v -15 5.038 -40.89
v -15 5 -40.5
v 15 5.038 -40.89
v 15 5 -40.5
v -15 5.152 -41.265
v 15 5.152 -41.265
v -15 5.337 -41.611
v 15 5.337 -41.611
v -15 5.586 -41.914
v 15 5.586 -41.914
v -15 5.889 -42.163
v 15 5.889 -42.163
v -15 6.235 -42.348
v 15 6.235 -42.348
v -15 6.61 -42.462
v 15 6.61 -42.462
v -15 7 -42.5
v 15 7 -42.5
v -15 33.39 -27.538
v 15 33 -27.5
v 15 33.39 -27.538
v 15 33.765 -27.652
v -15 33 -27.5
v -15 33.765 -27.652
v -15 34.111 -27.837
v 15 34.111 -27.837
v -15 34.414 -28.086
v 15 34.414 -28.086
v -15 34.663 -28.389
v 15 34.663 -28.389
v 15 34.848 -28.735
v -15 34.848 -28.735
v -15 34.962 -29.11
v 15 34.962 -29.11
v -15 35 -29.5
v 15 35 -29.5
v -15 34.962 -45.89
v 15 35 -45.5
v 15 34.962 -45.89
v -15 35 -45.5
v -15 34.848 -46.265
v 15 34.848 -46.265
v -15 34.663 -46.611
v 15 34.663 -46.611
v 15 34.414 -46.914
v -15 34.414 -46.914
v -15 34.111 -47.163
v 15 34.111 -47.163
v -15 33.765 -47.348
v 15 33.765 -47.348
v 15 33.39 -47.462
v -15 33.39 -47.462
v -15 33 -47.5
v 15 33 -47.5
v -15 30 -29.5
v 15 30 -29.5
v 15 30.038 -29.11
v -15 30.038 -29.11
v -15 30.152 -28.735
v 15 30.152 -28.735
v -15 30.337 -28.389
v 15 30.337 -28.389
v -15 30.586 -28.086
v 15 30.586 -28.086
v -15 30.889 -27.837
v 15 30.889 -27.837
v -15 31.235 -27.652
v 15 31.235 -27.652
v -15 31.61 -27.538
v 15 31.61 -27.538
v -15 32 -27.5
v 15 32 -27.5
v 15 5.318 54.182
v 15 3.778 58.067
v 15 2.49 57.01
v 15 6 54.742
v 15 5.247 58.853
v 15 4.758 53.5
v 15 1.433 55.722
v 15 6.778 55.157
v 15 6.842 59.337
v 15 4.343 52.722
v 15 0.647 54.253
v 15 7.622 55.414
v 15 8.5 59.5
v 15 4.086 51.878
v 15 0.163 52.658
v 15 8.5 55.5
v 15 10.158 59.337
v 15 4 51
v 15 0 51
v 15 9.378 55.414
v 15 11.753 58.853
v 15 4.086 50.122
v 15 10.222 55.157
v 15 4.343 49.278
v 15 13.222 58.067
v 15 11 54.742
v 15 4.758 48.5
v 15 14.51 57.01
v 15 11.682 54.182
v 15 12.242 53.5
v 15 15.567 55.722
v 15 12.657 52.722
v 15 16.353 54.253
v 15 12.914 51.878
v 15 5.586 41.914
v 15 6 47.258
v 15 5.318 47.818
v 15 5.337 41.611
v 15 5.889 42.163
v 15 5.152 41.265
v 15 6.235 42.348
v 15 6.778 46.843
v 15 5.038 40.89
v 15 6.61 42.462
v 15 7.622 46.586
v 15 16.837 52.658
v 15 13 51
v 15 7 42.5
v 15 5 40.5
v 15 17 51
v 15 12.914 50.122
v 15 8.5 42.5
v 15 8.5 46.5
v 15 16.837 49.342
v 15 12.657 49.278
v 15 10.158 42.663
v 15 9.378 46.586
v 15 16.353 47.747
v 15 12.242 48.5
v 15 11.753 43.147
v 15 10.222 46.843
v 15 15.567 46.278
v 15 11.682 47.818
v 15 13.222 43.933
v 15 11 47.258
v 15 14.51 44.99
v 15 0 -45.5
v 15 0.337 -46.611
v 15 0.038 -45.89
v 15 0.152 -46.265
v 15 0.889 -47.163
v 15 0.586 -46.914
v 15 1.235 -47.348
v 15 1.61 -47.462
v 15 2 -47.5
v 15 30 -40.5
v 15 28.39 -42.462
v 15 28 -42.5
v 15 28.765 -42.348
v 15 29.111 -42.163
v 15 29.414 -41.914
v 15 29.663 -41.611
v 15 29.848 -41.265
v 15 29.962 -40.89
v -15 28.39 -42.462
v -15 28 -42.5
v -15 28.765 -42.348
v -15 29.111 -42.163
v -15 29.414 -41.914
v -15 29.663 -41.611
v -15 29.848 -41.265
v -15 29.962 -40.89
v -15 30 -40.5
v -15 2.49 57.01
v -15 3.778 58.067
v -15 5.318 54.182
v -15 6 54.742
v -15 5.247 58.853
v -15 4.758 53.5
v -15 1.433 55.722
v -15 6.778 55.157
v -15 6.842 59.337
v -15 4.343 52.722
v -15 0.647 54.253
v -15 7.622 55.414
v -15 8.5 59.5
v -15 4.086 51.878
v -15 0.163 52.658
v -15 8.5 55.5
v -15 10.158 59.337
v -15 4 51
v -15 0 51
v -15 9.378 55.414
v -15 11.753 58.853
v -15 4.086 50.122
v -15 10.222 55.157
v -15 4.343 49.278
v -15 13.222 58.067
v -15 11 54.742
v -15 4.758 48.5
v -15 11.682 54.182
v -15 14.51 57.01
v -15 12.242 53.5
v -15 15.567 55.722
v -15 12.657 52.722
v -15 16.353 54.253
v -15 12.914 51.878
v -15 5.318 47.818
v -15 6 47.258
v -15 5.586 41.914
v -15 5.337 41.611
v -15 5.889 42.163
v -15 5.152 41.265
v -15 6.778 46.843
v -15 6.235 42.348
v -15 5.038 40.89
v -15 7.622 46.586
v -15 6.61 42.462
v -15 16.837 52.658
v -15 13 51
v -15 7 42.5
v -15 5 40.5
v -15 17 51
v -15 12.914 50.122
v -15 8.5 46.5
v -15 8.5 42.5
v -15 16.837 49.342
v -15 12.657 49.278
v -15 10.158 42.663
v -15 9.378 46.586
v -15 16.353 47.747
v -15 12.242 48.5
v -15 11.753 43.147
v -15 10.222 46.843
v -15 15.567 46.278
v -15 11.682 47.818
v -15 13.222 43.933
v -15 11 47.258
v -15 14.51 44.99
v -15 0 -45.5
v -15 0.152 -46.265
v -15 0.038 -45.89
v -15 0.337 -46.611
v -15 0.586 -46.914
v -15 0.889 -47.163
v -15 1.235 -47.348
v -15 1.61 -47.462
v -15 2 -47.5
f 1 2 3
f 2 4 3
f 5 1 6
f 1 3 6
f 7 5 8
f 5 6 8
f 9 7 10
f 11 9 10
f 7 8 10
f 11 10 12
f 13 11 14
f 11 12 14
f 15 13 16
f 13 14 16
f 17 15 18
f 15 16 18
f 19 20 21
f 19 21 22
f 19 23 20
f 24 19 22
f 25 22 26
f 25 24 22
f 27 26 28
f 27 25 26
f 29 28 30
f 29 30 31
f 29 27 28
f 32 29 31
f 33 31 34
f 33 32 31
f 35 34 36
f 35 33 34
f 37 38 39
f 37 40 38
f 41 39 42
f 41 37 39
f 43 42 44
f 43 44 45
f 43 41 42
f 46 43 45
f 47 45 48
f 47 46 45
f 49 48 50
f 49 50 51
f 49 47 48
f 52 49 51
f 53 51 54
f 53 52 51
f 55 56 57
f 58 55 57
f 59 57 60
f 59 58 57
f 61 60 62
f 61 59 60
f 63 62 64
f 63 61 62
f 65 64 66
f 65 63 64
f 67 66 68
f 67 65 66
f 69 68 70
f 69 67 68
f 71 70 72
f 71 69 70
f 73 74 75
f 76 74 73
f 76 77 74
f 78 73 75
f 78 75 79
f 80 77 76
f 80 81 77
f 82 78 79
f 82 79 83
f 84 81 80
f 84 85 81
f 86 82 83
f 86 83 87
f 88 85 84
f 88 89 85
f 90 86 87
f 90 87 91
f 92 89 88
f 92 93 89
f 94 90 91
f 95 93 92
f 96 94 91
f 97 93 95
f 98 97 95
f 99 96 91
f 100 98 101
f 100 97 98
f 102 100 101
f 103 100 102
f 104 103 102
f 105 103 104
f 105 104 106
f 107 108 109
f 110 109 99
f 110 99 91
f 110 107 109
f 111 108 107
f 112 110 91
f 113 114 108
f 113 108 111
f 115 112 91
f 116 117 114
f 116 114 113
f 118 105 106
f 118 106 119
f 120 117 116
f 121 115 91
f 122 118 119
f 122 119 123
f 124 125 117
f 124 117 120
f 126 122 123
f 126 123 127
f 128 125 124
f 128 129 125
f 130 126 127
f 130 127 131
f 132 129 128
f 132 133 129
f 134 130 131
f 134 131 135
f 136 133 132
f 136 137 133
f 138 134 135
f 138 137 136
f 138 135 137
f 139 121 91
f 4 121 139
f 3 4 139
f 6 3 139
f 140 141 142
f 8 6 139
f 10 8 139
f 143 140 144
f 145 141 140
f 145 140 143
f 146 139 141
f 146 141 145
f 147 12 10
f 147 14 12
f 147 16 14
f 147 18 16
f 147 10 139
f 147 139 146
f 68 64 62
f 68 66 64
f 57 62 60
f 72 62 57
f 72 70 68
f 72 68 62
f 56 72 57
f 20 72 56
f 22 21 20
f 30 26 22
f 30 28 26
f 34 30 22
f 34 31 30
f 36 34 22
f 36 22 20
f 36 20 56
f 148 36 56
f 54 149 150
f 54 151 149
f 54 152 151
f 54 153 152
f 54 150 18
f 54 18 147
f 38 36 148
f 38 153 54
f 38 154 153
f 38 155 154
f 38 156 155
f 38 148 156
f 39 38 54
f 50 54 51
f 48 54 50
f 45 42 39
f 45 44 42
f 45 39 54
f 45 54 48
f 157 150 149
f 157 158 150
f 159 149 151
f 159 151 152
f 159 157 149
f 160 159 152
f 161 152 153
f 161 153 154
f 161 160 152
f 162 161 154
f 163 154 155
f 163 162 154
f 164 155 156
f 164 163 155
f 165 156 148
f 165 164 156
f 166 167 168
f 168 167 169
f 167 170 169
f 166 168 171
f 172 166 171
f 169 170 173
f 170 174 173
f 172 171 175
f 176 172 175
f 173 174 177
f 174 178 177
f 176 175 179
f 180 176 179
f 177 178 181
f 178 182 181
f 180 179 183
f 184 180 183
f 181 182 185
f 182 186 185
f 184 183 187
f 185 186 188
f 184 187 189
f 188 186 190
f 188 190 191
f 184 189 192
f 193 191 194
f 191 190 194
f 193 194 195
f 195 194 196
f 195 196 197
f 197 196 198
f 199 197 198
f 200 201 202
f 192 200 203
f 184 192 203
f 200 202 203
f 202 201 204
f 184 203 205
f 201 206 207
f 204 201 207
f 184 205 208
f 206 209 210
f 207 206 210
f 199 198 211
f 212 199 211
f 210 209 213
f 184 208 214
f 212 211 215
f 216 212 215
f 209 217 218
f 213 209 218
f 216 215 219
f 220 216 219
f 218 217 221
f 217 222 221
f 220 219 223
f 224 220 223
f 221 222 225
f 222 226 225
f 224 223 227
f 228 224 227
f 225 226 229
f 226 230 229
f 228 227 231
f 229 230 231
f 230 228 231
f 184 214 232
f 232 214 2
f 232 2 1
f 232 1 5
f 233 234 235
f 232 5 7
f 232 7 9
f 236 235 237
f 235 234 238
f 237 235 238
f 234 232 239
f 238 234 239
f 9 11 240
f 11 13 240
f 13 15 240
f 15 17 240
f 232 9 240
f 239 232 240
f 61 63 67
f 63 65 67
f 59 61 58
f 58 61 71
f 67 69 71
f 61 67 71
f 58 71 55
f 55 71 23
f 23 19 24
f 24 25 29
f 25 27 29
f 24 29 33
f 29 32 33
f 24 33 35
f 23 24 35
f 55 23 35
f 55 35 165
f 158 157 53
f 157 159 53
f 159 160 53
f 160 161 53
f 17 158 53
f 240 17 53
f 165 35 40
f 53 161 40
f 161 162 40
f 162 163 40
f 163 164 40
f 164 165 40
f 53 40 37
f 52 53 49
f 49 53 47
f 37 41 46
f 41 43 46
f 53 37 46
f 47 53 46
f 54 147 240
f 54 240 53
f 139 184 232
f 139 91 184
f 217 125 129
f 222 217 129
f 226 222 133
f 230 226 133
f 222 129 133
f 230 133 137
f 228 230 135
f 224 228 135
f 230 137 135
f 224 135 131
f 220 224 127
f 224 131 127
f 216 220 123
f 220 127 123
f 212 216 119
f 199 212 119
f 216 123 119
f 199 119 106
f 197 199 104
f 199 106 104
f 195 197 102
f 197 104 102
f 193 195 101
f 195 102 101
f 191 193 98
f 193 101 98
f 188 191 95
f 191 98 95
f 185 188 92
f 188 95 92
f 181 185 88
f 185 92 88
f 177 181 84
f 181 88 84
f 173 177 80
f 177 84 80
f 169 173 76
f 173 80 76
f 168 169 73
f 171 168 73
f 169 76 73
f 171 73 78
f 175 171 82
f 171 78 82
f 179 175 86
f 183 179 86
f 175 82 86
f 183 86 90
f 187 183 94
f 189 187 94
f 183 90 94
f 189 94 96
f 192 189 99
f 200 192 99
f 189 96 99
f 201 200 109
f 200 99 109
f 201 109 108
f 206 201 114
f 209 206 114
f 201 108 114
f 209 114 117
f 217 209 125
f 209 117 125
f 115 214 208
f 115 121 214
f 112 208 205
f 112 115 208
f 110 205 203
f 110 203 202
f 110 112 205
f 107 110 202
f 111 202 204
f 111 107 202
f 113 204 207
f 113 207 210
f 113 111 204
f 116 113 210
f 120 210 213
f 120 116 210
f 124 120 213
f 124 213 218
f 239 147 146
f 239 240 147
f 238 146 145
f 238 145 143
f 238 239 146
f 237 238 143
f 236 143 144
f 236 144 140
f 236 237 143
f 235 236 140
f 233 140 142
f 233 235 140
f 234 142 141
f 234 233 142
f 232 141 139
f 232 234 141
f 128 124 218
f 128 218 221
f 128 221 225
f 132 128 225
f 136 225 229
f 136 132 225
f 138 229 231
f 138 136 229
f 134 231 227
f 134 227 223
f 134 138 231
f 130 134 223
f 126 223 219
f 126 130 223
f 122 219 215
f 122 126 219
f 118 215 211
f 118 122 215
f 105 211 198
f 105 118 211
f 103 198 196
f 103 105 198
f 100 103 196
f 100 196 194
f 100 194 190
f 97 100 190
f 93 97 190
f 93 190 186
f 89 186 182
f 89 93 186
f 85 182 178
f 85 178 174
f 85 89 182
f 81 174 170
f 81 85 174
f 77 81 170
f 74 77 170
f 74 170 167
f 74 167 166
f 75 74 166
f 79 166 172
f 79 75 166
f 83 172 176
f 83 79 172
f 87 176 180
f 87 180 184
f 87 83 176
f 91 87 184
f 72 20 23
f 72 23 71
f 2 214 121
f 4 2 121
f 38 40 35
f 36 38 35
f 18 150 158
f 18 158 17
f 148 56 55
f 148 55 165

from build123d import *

# Parameters (mm, degrees)
SKETCH1_W           = 30
SKETCH1_H           = 85
BOSS_EXTRUDE1_DEPTH = 5
SKETCH2_R           = 4.5
BOSS_EXTRUDE2_DEPTH = 30
FILLET1_R           = 2


with BuildPart() as part:
    # Sketch1 → Boss-Extrude1 (new body)
    with BuildSketch(Plane(origin=(0, 0, 0), x_dir=(1, 0, 0), z_dir=(0, 1, 0))):
        Rectangle(SKETCH1_W, SKETCH1_H)
    extrude(amount=BOSS_EXTRUDE1_DEPTH)

    # Sketch2 → Boss-Extrude2 (add)
    with BuildSketch(Plane(origin=(15, 0, 0), x_dir=(0, 0, -1), z_dir=(1, 0, 0))):
        with BuildLine():
            Line((-42.5, 5), (-42.5, 8.5))
            ThreePointArc((-42.5, 8.5), (-57.01040764, 14.51040764), (-51, 0))
            Line((-51, 0), (-42.5, 0))
            Line((-42.5, 0), (-42.5, 5))
        make_face()
        with Locations((-51, 8.5)):
            Circle(SKETCH2_R, mode=Mode.SUBTRACT)
        Polygon((42.5, 5), (42.5, 0), (47.5, 0), (47.5, 30), (42.5, 30), align=None)
        Polygon((42.5, 30), (47.5, 30), (47.5, 35), (27.5, 35), (27.5, 30), align=None)
    extrude(amount=-BOSS_EXTRUDE2_DEPTH)

    # Fillet1
    fillet1_edges = [part.edges().sort_by_distance(p)[0] for p in [
        (0, 5, -42.5),
        (0, 0, -47.5),
        (0, 30, -42.5),
        (0, 30, -27.5),
        (0, 35, -27.5),
        (0, 35, -47.5),
        (0, 5, 42.5),
    ]]
    fillet(fillet1_edges, radius=FILLET1_R)


solid = part.part
